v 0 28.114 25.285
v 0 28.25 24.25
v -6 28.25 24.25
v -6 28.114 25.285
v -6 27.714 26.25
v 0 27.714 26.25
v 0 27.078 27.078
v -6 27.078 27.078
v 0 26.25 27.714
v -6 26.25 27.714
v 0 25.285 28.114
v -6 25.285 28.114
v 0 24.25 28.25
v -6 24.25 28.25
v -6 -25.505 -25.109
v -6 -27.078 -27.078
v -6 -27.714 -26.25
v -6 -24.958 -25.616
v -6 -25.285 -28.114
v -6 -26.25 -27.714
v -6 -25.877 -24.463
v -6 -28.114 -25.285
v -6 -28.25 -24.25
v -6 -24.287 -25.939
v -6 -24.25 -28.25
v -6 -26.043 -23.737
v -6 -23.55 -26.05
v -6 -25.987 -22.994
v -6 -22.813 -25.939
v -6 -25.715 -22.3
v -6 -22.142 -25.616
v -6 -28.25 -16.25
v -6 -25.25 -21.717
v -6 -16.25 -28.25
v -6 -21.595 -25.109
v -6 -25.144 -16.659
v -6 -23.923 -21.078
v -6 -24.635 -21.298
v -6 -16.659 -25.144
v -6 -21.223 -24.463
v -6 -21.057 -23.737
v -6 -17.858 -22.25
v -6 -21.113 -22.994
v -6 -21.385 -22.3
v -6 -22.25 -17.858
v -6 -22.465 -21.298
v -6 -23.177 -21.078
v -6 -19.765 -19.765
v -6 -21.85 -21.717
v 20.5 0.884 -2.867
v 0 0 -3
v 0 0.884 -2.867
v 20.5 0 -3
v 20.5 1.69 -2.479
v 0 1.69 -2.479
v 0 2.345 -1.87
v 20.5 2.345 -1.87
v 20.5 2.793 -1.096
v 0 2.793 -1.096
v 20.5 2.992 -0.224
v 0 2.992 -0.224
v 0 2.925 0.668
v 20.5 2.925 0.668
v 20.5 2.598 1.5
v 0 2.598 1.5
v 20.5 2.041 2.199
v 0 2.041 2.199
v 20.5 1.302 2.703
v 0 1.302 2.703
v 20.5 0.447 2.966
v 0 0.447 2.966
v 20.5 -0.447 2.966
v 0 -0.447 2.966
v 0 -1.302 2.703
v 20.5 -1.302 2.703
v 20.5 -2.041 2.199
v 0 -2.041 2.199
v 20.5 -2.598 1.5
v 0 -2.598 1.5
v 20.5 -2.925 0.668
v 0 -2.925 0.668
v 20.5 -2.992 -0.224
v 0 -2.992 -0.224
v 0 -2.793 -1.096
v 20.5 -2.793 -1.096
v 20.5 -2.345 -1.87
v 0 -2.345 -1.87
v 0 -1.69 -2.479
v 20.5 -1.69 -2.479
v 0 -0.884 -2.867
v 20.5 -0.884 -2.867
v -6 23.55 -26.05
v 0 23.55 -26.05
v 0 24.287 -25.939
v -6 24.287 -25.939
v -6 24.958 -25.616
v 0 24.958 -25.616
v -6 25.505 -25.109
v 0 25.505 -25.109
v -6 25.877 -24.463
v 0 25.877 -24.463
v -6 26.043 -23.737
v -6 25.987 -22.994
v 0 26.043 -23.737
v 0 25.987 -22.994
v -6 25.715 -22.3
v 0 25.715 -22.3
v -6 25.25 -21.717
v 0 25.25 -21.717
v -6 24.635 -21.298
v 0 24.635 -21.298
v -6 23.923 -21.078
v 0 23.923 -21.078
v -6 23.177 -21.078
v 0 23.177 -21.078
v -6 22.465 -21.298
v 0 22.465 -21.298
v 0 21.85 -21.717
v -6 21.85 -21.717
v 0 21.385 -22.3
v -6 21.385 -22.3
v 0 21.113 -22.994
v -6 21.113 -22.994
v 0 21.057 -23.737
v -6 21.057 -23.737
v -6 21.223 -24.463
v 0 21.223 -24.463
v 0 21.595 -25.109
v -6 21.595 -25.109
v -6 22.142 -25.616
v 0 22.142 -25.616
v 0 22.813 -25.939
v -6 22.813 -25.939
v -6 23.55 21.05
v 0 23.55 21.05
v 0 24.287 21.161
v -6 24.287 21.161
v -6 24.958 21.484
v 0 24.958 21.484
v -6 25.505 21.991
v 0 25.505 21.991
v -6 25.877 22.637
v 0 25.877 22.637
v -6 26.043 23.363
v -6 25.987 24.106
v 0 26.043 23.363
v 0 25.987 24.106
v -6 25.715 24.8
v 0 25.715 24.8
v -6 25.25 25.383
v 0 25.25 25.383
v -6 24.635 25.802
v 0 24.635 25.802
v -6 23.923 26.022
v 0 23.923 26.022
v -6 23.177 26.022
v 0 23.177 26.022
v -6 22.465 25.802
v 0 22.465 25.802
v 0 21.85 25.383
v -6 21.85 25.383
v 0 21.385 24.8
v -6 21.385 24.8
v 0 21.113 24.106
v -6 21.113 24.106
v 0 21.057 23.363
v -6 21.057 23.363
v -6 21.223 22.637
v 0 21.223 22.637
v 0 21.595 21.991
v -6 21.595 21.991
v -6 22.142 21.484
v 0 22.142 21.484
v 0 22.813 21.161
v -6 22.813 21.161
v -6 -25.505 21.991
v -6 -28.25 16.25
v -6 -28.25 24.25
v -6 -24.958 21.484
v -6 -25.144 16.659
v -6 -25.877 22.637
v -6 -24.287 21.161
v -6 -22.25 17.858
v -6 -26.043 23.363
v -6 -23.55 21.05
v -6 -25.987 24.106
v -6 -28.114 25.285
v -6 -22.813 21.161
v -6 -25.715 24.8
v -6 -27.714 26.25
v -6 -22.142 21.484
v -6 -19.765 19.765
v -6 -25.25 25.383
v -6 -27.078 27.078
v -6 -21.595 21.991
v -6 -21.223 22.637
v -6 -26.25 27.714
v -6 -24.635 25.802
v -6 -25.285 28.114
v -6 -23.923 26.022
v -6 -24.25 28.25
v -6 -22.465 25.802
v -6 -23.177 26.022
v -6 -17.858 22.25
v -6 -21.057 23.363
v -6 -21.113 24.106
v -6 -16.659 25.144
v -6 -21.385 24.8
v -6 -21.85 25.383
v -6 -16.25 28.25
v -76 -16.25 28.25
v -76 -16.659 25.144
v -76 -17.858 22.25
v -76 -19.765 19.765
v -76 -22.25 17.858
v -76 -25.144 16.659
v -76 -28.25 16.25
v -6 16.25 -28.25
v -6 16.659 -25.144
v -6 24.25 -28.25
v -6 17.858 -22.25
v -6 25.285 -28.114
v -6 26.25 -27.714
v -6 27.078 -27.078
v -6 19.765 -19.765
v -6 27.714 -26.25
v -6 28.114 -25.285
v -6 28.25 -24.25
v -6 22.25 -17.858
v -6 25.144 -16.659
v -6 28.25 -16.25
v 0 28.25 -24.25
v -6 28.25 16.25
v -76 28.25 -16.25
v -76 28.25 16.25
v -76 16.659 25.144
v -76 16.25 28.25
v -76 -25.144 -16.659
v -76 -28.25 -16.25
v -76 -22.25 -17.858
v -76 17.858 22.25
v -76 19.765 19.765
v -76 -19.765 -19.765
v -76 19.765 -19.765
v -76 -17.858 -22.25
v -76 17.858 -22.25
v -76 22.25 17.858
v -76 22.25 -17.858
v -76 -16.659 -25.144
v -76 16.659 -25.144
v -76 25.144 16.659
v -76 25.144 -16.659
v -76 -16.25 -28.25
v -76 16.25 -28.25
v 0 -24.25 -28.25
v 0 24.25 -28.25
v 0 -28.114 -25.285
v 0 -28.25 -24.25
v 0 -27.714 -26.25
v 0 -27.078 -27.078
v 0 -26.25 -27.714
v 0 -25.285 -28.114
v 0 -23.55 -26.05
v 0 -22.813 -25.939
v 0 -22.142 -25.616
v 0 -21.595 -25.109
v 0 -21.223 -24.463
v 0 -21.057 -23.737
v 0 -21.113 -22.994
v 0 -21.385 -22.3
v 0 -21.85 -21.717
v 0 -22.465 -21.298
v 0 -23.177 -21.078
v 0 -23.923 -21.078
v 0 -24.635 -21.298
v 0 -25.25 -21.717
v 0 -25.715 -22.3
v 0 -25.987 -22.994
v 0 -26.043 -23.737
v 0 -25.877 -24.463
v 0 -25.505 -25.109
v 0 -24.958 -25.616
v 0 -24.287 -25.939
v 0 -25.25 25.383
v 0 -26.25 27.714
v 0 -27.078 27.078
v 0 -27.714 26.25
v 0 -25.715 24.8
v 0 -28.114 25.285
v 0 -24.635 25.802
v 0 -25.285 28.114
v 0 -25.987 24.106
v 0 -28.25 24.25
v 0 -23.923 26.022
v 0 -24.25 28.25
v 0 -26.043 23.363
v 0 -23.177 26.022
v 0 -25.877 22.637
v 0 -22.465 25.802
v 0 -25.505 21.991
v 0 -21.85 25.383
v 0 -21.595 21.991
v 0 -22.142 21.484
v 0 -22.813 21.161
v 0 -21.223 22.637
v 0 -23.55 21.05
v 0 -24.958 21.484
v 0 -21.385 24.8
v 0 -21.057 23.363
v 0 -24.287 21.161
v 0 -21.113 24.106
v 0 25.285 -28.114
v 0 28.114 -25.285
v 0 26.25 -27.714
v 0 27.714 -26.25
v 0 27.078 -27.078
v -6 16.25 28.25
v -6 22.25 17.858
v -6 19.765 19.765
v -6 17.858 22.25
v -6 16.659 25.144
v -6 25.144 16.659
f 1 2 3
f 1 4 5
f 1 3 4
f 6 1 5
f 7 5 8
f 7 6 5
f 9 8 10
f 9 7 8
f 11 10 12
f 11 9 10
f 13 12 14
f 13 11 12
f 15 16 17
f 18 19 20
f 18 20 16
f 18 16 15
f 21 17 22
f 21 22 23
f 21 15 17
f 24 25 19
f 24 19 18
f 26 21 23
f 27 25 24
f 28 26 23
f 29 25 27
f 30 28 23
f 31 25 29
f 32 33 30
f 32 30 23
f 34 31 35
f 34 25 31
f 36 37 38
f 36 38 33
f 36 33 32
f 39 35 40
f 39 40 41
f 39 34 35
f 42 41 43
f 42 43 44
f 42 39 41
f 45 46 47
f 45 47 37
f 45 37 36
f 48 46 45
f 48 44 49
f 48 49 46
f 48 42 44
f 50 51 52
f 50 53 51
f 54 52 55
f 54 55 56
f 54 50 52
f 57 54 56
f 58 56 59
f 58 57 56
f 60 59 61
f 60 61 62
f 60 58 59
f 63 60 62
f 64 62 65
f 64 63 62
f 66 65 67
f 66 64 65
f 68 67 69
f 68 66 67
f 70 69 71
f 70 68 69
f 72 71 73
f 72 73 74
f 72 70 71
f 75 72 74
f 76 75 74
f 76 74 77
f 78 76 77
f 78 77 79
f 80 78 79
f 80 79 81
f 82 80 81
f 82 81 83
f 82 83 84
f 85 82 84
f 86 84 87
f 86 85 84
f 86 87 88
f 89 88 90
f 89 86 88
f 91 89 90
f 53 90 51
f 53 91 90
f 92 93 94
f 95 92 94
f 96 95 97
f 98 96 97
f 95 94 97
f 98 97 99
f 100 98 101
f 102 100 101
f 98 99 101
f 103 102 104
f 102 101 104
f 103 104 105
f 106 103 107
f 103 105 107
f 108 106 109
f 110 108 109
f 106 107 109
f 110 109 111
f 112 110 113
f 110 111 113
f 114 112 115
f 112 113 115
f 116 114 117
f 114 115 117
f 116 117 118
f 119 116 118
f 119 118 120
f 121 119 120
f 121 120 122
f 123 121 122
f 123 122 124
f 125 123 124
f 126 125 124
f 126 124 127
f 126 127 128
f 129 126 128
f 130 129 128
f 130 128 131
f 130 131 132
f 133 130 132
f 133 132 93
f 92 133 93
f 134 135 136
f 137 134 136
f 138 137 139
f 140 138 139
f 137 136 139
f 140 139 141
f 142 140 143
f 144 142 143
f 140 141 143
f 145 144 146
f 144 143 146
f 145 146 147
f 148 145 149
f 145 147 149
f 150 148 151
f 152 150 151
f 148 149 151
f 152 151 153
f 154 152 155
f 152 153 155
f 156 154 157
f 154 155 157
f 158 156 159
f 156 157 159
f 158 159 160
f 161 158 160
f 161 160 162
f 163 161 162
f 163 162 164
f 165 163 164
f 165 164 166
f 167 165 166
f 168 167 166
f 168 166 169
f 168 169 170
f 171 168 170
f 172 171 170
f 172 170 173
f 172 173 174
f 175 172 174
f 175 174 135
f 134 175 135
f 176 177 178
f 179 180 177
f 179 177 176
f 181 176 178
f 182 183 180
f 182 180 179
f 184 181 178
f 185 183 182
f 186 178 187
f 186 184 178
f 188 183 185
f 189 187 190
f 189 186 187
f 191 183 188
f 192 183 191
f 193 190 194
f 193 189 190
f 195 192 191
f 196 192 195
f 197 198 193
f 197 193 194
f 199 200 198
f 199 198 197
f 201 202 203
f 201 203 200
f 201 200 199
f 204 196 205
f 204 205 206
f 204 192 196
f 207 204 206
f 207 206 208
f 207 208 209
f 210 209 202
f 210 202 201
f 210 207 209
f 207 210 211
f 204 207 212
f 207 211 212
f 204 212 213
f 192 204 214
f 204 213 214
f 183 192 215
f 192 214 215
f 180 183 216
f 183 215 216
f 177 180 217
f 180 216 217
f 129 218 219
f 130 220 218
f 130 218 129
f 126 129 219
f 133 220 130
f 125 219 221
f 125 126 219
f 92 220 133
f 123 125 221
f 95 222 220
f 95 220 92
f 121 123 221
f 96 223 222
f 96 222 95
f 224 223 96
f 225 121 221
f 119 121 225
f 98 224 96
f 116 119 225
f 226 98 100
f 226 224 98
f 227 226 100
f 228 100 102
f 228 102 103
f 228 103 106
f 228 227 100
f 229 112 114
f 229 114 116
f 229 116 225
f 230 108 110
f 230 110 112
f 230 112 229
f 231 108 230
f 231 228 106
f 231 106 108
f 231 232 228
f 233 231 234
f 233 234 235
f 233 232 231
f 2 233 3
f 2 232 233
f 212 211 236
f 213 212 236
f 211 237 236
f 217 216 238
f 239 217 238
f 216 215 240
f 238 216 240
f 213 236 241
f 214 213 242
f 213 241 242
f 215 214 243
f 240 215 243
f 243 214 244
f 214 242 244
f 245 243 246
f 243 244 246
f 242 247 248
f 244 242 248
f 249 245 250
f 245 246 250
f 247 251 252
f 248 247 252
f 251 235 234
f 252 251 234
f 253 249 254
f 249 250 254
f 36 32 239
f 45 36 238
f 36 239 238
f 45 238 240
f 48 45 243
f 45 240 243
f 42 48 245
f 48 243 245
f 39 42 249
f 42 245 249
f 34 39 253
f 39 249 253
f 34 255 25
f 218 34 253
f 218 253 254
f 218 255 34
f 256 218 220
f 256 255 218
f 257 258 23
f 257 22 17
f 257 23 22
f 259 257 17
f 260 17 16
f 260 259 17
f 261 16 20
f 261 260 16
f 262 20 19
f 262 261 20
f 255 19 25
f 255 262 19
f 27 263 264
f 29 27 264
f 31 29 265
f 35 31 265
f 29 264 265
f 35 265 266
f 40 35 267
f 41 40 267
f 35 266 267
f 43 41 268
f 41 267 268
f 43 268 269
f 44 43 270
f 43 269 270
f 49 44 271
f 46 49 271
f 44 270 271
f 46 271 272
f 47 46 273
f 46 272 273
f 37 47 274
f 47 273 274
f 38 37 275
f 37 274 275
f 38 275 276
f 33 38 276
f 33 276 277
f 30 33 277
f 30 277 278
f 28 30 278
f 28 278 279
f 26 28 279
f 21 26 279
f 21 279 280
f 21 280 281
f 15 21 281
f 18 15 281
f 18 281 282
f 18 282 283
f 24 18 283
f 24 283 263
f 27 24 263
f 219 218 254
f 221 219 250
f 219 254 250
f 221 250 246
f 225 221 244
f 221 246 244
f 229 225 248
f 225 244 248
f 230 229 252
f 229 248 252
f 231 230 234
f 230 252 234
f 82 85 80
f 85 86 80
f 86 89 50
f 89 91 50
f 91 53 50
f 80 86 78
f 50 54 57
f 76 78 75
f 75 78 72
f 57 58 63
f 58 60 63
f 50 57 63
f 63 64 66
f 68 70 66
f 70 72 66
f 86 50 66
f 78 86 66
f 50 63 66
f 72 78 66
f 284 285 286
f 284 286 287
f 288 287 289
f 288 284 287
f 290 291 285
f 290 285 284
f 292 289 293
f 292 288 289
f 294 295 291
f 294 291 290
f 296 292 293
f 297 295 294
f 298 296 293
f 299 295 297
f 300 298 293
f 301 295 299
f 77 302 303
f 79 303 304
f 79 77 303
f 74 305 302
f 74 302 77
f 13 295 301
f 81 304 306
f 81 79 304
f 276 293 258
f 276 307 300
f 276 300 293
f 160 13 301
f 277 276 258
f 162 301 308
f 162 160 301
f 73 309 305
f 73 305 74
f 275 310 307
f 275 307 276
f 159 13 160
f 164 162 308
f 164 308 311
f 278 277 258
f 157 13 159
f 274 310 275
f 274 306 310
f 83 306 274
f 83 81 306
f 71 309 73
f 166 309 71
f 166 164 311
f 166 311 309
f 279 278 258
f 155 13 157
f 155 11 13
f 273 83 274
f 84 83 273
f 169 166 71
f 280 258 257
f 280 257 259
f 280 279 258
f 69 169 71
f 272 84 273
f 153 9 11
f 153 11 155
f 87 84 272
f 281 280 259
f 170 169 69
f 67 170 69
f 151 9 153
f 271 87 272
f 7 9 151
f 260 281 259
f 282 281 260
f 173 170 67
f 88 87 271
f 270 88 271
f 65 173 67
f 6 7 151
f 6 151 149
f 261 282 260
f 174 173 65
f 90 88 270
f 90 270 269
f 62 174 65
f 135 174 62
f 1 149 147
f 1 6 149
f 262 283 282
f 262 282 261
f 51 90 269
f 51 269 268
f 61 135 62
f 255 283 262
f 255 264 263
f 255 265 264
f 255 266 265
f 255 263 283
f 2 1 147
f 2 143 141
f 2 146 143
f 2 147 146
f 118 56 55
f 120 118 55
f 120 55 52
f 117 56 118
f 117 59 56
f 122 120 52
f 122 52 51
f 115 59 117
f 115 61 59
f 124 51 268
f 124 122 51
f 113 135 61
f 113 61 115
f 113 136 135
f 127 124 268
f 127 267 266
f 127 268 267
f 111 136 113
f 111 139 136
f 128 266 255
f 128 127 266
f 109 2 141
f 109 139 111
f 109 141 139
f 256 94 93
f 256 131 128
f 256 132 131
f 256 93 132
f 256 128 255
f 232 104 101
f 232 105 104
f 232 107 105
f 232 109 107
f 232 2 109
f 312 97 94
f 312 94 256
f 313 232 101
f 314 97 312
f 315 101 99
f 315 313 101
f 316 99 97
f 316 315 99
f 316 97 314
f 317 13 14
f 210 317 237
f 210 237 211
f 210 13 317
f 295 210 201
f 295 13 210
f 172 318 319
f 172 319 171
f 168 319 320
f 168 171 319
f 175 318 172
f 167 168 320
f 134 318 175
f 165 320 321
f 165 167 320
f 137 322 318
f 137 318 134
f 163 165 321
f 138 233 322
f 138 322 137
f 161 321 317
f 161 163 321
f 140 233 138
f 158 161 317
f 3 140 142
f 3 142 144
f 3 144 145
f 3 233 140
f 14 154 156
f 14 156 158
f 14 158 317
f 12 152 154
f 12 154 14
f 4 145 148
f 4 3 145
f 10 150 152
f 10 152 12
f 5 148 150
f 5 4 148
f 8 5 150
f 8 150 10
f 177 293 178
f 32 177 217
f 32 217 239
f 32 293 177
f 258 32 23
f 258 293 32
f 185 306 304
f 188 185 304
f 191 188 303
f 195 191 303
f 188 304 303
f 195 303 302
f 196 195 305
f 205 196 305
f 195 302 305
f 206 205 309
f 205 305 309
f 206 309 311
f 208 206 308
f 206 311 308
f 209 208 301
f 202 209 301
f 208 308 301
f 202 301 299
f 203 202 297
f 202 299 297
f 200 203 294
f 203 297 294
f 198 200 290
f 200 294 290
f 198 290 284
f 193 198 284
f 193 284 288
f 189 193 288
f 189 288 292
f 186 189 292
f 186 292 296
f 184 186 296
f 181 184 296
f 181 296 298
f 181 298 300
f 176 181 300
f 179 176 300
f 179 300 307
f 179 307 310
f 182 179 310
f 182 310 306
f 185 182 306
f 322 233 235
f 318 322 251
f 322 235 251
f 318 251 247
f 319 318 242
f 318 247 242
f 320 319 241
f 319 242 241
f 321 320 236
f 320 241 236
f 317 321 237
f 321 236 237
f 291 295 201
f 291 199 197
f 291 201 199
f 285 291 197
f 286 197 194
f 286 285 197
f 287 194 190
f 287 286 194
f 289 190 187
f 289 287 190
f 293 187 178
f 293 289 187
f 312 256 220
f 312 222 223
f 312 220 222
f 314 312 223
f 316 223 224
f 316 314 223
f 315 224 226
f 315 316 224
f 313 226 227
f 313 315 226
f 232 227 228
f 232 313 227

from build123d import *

# Parameters (mm, degrees)
SKETCH1_R           = 2.5
BOSS_EXTRUDE1_DEPTH = 76
SKETCH2_W           = 20.5
SKETCH2_H           = 3
CUT_EXTRUDE1_DEPTH  = 70


with BuildPart() as part:
    # Sketch1 → Boss-Extrude1 (new body)
    with BuildSketch(Plane(origin=(0, 0, 0), x_dir=(0, 0, -1), z_dir=(1, 0, 0))):
        with BuildLine():
            Line((-24.25, -28.25), (24.25, -28.25))
            ThreePointArc((24.25, -28.25), (27.078427125, -27.078427125), (28.25, -24.25))
            Line((28.25, -24.25), (28.25, 24.25))
            ThreePointArc((28.25, 24.25), (27.078427125, 27.078427125), (24.25, 28.25))
            Line((24.25, 28.25), (-24.25, 28.25))
            ThreePointArc((-24.25, 28.25), (-27.078427125, 27.078427125), (-28.25, 24.25))
            Line((-28.25, 24.25), (-28.25, -24.25))
            ThreePointArc((-28.25, -24.25), (-27.078427125, -27.078427125), (-24.25, -28.25))
        make_face()
        with Locations((-23.55, 23.55)):
            Circle(SKETCH1_R, mode=Mode.SUBTRACT)
        with Locations((-23.55, -23.55)):
            Circle(SKETCH1_R, mode=Mode.SUBTRACT)
        with Locations((23.55, -23.55)):
            Circle(SKETCH1_R, mode=Mode.SUBTRACT)
        with Locations((23.55, 23.55)):
            Circle(SKETCH1_R, mode=Mode.SUBTRACT)
    extrude(amount=-BOSS_EXTRUDE1_DEPTH)

    # Sketch2 → Revolve1 (revolve)
    with BuildSketch(Plane(origin=(0, 0, 0), x_dir=(1, 0, 0), z_dir=(0, 1, 0))):
        with Locations((10.25, 1.5)):
            Rectangle(SKETCH2_W, SKETCH2_H)
    revolve(axis=Axis((0, 0, 0), (1, 0, 0)))

    # Sketch3 → Cut-Extrude1 (cut)
    with BuildSketch(Plane.ZY.offset(76)):
        with BuildLine():
            Line((-28.25, -16.25), (-28.25, -24.25))
            ThreePointArc((-28.25, -24.25), (-27.078427125, -27.078427125), (-24.25, -28.25))
            Line((-24.25, -28.25), (-16.25, -28.25))
            ThreePointArc((-16.25, -28.25), (-19.764718626, -19.764718626), (-28.25, -16.25))
        make_face()
        with BuildLine():
            Line((-16.25, 28.25), (-24.25, 28.25))
            ThreePointArc((-24.25, 28.25), (-27.078427125, 27.078427125), (-28.25, 24.25))
            Line((-28.25, 24.25), (-28.25, 16.25))
            ThreePointArc((-28.25, 16.25), (-19.764718626, 19.764718626), (-16.25, 28.25))
        make_face()
        with BuildLine():
            Line((28.25, 16.25), (28.25, 24.25))
            ThreePointArc((28.25, 24.25), (27.078427125, 27.078427125), (24.25, 28.25))
            Line((24.25, 28.25), (16.25, 28.25))
            ThreePointArc((16.25, 28.25), (19.764718626, 19.764718626), (28.25, 16.25))
        make_face()
        with BuildLine():
            Line((16.25, -28.25), (24.25, -28.25))
            ThreePointArc((24.25, -28.25), (27.078427125, -27.078427125), (28.25, -24.25))
            Line((28.25, -24.25), (28.25, -16.25))
            ThreePointArc((28.25, -16.25), (19.764718626, -19.764718626), (16.25, -28.25))
        make_face()
    extrude(amount=-CUT_EXTRUDE1_DEPTH, mode=Mode.SUBTRACT)


solid = part.part
